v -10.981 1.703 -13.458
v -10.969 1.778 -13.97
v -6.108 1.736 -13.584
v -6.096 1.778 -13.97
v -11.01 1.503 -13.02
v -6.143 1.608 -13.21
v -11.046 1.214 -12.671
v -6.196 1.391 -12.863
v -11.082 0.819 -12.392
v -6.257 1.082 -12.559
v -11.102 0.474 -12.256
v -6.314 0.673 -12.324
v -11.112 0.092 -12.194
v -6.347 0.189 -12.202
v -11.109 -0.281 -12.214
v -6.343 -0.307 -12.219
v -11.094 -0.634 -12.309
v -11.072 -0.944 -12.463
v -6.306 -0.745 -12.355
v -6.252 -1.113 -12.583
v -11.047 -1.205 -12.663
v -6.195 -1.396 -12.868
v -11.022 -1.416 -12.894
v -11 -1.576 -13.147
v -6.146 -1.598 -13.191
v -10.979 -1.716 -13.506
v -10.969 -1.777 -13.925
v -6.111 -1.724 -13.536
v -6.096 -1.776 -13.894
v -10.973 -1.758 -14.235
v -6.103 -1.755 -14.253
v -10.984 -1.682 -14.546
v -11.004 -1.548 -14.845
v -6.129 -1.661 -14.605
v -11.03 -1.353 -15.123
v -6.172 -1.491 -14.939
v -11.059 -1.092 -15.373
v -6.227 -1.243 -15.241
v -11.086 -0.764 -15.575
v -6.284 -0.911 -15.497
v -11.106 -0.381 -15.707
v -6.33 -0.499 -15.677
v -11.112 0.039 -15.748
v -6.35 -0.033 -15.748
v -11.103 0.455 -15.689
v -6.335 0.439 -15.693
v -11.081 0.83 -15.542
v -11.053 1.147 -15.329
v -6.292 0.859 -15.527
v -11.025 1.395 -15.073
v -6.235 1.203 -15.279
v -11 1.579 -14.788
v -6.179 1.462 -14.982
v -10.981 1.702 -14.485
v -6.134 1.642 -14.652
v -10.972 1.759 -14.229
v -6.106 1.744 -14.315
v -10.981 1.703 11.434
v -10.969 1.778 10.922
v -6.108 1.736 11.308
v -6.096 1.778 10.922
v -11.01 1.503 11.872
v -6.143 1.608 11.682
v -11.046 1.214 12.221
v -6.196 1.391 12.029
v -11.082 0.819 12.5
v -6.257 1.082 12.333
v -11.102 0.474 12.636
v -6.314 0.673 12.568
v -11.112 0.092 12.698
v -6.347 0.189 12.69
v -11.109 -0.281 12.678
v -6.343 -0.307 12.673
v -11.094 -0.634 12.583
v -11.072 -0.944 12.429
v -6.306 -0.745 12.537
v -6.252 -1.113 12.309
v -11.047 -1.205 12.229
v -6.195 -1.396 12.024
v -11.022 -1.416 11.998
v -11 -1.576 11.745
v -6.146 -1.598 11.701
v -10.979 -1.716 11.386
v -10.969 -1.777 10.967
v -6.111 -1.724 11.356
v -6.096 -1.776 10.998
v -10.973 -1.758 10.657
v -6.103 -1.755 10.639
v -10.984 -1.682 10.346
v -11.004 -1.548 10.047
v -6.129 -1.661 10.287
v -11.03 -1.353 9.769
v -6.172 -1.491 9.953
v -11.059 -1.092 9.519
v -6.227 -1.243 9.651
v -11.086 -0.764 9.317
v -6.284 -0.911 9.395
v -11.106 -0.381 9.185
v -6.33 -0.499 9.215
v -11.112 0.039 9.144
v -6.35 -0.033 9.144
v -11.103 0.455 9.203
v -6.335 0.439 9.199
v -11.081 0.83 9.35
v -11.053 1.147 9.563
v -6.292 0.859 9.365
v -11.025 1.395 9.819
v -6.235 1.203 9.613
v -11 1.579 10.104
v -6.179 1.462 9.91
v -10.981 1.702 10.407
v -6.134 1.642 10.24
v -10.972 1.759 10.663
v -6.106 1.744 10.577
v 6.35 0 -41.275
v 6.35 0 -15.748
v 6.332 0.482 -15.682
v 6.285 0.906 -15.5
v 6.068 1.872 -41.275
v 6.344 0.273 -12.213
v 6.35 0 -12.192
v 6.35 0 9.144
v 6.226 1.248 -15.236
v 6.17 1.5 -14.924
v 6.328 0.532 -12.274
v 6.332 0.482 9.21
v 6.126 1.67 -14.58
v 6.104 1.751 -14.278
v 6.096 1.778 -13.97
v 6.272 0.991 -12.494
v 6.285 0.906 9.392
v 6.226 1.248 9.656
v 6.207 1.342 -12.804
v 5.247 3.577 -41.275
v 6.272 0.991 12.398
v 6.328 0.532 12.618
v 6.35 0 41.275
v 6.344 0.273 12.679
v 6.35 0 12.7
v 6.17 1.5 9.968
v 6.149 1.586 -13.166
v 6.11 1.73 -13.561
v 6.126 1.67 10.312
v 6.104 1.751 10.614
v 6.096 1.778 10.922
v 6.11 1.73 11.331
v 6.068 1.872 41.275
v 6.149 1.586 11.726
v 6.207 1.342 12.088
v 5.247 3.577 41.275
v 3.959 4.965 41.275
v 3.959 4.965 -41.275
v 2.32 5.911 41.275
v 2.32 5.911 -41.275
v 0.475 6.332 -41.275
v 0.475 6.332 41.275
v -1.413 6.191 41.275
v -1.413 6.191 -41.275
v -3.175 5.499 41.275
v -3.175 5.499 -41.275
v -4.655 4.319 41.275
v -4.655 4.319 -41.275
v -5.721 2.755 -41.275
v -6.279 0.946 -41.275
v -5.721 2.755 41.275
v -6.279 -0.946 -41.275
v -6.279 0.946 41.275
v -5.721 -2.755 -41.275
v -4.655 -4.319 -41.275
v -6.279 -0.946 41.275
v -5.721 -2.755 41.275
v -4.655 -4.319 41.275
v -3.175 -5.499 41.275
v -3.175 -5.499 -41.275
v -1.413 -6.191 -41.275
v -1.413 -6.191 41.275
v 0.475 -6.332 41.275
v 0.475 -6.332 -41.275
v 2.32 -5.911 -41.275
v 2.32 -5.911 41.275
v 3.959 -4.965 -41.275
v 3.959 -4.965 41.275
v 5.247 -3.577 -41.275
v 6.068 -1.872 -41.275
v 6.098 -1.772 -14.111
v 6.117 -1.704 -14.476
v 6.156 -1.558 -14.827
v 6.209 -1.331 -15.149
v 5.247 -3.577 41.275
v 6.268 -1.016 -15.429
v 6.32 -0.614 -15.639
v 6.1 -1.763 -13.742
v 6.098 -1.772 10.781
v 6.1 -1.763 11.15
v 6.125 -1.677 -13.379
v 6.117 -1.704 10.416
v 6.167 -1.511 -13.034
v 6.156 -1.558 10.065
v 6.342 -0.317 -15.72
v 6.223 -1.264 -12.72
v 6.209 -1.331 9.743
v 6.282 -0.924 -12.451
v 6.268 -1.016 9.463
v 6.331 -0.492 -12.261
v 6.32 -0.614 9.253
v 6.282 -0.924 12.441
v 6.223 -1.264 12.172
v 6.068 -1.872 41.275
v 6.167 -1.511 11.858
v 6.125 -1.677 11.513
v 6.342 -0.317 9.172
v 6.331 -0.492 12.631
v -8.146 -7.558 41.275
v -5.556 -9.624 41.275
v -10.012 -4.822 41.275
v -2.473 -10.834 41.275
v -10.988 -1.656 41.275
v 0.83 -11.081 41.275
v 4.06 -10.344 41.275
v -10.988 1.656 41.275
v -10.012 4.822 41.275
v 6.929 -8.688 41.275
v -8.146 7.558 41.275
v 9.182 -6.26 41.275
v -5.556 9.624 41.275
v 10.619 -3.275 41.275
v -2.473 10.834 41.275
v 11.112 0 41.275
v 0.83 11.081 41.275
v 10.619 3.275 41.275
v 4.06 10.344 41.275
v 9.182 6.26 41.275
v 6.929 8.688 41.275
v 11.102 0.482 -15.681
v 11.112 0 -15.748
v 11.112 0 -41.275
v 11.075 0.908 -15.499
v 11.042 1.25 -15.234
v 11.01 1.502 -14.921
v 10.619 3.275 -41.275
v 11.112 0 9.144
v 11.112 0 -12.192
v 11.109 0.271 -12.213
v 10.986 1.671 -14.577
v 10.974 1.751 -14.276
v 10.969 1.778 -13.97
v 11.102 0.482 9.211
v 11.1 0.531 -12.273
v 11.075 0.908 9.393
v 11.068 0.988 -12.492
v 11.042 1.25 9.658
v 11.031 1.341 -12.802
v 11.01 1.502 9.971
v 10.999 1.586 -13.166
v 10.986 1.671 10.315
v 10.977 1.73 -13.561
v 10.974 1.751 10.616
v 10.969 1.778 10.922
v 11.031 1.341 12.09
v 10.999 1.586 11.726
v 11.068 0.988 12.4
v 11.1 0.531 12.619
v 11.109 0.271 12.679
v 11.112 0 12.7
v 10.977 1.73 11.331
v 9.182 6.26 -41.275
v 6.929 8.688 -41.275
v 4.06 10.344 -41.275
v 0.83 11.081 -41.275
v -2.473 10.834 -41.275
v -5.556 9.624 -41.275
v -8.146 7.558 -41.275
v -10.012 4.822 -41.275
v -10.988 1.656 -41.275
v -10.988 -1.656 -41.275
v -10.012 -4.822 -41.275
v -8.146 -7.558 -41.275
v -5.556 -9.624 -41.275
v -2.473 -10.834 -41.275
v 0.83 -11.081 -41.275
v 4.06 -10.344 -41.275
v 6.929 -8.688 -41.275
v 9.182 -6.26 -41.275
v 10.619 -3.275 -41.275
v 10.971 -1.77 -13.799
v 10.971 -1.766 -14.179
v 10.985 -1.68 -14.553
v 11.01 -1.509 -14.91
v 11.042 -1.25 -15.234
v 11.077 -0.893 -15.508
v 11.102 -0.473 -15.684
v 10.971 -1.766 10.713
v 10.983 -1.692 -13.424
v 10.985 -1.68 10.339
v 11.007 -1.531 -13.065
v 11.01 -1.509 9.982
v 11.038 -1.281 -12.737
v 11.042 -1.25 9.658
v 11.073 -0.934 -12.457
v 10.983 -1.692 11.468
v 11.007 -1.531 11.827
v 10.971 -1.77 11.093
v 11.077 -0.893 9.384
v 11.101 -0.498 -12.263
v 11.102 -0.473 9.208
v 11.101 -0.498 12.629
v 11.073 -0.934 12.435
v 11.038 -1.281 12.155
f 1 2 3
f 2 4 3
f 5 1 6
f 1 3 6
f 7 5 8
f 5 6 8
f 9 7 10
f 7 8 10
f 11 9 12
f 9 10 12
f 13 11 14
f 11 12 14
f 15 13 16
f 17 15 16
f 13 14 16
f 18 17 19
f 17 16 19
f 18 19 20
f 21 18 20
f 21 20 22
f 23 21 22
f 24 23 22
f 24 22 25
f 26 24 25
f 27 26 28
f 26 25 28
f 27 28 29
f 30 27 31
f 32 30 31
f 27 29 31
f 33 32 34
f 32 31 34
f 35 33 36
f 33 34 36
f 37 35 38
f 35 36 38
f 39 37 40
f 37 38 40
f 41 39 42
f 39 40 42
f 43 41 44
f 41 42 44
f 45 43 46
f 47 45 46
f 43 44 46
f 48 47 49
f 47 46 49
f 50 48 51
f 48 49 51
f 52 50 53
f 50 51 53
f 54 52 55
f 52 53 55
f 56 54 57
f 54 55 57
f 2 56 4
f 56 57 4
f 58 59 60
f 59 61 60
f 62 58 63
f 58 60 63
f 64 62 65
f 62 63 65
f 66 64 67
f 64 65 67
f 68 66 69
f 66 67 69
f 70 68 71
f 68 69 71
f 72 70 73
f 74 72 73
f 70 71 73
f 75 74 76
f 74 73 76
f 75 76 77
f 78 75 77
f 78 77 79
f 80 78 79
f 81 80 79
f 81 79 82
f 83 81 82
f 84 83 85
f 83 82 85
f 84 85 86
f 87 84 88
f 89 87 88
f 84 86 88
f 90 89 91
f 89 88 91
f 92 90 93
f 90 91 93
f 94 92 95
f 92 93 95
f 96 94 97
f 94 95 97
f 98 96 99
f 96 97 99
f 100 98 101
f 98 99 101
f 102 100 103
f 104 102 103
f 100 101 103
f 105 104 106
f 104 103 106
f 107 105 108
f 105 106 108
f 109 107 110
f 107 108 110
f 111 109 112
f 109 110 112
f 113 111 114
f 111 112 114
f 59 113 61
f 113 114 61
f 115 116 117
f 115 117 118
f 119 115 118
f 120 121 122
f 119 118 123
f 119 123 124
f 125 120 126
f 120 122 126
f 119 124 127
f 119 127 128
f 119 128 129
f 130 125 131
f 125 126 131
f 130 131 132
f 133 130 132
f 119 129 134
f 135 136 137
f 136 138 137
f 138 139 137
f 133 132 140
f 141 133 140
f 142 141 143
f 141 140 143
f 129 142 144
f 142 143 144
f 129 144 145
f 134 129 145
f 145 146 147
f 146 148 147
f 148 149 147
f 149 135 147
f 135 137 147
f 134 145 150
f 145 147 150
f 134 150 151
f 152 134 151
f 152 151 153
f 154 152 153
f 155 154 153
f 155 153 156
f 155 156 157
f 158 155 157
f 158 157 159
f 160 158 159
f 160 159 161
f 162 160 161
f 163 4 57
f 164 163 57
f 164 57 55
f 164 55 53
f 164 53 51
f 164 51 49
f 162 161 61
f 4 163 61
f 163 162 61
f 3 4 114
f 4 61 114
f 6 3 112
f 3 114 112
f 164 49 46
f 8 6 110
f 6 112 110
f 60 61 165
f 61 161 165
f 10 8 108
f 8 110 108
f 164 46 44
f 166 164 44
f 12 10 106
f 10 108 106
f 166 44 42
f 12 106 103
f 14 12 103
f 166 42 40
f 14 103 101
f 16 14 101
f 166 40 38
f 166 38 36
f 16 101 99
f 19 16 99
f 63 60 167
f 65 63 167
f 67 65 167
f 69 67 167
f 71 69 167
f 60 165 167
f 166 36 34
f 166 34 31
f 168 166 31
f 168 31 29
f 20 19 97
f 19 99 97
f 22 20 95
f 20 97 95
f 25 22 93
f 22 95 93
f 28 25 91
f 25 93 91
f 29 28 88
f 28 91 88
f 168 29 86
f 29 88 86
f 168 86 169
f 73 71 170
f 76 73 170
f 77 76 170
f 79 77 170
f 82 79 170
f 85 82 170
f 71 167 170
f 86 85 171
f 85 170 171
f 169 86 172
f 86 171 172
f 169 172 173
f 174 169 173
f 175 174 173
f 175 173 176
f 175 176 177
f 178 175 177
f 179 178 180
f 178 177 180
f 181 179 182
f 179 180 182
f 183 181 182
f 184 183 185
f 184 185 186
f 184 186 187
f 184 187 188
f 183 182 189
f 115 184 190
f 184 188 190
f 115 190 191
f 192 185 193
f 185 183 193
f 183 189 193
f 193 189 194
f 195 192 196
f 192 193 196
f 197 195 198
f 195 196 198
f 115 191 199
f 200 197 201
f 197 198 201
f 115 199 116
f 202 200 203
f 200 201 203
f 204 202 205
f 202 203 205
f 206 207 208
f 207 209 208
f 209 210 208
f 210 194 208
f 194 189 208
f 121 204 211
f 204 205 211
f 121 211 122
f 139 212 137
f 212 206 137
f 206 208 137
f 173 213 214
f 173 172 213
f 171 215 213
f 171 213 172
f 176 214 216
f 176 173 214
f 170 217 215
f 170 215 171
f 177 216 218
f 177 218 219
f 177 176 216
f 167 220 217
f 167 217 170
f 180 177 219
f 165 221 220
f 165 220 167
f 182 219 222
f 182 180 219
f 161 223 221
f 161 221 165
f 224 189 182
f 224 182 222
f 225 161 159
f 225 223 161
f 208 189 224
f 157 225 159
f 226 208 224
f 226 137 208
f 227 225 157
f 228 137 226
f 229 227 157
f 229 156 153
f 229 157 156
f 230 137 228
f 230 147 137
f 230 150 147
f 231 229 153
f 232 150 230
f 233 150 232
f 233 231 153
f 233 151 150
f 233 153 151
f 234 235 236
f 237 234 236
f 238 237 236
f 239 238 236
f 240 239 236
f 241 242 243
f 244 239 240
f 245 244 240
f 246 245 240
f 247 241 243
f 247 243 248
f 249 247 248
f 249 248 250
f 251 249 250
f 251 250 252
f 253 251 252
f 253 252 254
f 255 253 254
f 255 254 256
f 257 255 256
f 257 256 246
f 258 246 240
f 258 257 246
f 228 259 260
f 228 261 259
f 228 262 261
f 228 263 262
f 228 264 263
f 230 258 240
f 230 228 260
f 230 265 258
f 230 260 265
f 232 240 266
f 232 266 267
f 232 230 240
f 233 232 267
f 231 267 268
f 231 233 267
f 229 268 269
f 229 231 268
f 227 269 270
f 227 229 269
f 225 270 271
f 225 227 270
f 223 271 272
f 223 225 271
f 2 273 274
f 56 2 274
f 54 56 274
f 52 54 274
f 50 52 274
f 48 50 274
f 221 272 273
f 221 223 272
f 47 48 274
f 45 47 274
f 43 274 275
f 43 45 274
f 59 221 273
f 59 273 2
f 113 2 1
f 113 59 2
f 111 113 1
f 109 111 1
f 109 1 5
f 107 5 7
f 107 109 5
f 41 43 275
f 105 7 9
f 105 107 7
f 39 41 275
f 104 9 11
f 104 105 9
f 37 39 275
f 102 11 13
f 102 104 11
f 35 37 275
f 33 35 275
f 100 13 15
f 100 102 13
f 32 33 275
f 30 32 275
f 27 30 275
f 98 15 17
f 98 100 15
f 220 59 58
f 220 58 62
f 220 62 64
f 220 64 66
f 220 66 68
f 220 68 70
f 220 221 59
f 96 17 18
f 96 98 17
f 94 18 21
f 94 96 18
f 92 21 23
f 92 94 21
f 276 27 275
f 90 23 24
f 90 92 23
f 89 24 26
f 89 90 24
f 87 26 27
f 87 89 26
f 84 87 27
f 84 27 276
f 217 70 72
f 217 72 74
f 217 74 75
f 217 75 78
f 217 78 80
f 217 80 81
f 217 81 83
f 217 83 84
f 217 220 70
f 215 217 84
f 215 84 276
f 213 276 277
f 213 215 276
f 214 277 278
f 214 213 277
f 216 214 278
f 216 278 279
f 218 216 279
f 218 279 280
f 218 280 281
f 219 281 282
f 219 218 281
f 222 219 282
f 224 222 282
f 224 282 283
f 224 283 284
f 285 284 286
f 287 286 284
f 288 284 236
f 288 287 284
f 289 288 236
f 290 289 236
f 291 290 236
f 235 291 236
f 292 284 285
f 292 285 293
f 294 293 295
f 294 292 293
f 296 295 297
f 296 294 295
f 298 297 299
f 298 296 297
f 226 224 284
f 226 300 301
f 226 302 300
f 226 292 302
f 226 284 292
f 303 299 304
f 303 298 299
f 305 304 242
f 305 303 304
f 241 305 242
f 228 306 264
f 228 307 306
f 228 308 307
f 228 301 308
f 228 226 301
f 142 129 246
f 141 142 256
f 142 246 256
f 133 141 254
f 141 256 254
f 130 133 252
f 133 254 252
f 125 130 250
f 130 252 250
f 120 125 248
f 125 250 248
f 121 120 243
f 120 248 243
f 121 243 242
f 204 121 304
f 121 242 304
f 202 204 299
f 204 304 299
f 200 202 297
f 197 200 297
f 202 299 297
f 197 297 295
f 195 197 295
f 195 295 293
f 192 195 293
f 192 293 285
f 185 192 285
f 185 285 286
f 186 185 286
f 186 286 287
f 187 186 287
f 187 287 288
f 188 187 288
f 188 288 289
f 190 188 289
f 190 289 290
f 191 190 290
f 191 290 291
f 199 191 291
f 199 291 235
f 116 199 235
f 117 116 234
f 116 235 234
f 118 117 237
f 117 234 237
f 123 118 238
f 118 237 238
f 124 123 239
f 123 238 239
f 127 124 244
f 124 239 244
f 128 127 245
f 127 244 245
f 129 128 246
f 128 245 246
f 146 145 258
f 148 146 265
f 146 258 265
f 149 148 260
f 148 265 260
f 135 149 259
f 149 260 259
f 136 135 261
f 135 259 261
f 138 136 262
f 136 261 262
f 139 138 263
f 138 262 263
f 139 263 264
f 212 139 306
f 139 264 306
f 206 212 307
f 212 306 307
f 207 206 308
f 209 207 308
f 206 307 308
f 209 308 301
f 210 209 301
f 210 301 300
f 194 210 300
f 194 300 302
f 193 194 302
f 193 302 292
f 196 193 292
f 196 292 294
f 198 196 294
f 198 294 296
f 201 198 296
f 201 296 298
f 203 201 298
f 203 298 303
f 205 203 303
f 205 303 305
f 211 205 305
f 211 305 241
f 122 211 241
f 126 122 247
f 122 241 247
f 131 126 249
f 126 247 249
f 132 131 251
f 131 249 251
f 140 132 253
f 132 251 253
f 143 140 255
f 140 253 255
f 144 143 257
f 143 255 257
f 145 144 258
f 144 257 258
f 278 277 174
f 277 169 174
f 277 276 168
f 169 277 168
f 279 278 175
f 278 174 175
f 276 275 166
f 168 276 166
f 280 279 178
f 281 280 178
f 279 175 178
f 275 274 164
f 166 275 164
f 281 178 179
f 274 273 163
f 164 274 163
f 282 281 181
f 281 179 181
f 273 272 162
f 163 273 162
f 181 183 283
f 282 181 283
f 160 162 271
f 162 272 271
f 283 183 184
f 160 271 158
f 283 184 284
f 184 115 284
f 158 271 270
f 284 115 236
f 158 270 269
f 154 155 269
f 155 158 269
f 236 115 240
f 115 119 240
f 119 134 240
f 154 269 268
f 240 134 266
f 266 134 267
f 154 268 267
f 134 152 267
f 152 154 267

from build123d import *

# Parameters (mm, degrees)
F0_R     = 11.1125
F1_DEPTH = 41.275
F2_R     = 6.35
F3_DEPTH = 82.55
F4_R     = 1.778
F5_DEPTH = 11.1125
F6_R     = 1.778
F7_DEPTH = 11.1125


with BuildPart() as f1:
    # F0 (on Top) → F1 (new body, symmetric)
    with BuildSketch(Plane.XY):
        Circle(F0_R)
    extrude(amount=F1_DEPTH, both=True)

    # F2 (on face) → F3 (cut, through all)
    with BuildSketch(Plane.XY.offset(41.275)):
        Circle(F2_R)
    extrude(amount=-F3_DEPTH, mode=Mode.SUBTRACT)

    # F4 (on Right) → F5 (cut, symmetric)
    with BuildSketch(Plane.YZ):
        with Locations((0, 10.922)):
            Circle(F4_R)
    extrude(amount=F5_DEPTH, both=True, mode=Mode.SUBTRACT)

    # F6 (on Right) → F7 (cut, symmetric)
    with BuildSketch(Plane.YZ):
        with Locations((0, -13.97)):
            Circle(F6_R)
    extrude(amount=F7_DEPTH, both=True, mode=Mode.SUBTRACT)


solid = f1.part
